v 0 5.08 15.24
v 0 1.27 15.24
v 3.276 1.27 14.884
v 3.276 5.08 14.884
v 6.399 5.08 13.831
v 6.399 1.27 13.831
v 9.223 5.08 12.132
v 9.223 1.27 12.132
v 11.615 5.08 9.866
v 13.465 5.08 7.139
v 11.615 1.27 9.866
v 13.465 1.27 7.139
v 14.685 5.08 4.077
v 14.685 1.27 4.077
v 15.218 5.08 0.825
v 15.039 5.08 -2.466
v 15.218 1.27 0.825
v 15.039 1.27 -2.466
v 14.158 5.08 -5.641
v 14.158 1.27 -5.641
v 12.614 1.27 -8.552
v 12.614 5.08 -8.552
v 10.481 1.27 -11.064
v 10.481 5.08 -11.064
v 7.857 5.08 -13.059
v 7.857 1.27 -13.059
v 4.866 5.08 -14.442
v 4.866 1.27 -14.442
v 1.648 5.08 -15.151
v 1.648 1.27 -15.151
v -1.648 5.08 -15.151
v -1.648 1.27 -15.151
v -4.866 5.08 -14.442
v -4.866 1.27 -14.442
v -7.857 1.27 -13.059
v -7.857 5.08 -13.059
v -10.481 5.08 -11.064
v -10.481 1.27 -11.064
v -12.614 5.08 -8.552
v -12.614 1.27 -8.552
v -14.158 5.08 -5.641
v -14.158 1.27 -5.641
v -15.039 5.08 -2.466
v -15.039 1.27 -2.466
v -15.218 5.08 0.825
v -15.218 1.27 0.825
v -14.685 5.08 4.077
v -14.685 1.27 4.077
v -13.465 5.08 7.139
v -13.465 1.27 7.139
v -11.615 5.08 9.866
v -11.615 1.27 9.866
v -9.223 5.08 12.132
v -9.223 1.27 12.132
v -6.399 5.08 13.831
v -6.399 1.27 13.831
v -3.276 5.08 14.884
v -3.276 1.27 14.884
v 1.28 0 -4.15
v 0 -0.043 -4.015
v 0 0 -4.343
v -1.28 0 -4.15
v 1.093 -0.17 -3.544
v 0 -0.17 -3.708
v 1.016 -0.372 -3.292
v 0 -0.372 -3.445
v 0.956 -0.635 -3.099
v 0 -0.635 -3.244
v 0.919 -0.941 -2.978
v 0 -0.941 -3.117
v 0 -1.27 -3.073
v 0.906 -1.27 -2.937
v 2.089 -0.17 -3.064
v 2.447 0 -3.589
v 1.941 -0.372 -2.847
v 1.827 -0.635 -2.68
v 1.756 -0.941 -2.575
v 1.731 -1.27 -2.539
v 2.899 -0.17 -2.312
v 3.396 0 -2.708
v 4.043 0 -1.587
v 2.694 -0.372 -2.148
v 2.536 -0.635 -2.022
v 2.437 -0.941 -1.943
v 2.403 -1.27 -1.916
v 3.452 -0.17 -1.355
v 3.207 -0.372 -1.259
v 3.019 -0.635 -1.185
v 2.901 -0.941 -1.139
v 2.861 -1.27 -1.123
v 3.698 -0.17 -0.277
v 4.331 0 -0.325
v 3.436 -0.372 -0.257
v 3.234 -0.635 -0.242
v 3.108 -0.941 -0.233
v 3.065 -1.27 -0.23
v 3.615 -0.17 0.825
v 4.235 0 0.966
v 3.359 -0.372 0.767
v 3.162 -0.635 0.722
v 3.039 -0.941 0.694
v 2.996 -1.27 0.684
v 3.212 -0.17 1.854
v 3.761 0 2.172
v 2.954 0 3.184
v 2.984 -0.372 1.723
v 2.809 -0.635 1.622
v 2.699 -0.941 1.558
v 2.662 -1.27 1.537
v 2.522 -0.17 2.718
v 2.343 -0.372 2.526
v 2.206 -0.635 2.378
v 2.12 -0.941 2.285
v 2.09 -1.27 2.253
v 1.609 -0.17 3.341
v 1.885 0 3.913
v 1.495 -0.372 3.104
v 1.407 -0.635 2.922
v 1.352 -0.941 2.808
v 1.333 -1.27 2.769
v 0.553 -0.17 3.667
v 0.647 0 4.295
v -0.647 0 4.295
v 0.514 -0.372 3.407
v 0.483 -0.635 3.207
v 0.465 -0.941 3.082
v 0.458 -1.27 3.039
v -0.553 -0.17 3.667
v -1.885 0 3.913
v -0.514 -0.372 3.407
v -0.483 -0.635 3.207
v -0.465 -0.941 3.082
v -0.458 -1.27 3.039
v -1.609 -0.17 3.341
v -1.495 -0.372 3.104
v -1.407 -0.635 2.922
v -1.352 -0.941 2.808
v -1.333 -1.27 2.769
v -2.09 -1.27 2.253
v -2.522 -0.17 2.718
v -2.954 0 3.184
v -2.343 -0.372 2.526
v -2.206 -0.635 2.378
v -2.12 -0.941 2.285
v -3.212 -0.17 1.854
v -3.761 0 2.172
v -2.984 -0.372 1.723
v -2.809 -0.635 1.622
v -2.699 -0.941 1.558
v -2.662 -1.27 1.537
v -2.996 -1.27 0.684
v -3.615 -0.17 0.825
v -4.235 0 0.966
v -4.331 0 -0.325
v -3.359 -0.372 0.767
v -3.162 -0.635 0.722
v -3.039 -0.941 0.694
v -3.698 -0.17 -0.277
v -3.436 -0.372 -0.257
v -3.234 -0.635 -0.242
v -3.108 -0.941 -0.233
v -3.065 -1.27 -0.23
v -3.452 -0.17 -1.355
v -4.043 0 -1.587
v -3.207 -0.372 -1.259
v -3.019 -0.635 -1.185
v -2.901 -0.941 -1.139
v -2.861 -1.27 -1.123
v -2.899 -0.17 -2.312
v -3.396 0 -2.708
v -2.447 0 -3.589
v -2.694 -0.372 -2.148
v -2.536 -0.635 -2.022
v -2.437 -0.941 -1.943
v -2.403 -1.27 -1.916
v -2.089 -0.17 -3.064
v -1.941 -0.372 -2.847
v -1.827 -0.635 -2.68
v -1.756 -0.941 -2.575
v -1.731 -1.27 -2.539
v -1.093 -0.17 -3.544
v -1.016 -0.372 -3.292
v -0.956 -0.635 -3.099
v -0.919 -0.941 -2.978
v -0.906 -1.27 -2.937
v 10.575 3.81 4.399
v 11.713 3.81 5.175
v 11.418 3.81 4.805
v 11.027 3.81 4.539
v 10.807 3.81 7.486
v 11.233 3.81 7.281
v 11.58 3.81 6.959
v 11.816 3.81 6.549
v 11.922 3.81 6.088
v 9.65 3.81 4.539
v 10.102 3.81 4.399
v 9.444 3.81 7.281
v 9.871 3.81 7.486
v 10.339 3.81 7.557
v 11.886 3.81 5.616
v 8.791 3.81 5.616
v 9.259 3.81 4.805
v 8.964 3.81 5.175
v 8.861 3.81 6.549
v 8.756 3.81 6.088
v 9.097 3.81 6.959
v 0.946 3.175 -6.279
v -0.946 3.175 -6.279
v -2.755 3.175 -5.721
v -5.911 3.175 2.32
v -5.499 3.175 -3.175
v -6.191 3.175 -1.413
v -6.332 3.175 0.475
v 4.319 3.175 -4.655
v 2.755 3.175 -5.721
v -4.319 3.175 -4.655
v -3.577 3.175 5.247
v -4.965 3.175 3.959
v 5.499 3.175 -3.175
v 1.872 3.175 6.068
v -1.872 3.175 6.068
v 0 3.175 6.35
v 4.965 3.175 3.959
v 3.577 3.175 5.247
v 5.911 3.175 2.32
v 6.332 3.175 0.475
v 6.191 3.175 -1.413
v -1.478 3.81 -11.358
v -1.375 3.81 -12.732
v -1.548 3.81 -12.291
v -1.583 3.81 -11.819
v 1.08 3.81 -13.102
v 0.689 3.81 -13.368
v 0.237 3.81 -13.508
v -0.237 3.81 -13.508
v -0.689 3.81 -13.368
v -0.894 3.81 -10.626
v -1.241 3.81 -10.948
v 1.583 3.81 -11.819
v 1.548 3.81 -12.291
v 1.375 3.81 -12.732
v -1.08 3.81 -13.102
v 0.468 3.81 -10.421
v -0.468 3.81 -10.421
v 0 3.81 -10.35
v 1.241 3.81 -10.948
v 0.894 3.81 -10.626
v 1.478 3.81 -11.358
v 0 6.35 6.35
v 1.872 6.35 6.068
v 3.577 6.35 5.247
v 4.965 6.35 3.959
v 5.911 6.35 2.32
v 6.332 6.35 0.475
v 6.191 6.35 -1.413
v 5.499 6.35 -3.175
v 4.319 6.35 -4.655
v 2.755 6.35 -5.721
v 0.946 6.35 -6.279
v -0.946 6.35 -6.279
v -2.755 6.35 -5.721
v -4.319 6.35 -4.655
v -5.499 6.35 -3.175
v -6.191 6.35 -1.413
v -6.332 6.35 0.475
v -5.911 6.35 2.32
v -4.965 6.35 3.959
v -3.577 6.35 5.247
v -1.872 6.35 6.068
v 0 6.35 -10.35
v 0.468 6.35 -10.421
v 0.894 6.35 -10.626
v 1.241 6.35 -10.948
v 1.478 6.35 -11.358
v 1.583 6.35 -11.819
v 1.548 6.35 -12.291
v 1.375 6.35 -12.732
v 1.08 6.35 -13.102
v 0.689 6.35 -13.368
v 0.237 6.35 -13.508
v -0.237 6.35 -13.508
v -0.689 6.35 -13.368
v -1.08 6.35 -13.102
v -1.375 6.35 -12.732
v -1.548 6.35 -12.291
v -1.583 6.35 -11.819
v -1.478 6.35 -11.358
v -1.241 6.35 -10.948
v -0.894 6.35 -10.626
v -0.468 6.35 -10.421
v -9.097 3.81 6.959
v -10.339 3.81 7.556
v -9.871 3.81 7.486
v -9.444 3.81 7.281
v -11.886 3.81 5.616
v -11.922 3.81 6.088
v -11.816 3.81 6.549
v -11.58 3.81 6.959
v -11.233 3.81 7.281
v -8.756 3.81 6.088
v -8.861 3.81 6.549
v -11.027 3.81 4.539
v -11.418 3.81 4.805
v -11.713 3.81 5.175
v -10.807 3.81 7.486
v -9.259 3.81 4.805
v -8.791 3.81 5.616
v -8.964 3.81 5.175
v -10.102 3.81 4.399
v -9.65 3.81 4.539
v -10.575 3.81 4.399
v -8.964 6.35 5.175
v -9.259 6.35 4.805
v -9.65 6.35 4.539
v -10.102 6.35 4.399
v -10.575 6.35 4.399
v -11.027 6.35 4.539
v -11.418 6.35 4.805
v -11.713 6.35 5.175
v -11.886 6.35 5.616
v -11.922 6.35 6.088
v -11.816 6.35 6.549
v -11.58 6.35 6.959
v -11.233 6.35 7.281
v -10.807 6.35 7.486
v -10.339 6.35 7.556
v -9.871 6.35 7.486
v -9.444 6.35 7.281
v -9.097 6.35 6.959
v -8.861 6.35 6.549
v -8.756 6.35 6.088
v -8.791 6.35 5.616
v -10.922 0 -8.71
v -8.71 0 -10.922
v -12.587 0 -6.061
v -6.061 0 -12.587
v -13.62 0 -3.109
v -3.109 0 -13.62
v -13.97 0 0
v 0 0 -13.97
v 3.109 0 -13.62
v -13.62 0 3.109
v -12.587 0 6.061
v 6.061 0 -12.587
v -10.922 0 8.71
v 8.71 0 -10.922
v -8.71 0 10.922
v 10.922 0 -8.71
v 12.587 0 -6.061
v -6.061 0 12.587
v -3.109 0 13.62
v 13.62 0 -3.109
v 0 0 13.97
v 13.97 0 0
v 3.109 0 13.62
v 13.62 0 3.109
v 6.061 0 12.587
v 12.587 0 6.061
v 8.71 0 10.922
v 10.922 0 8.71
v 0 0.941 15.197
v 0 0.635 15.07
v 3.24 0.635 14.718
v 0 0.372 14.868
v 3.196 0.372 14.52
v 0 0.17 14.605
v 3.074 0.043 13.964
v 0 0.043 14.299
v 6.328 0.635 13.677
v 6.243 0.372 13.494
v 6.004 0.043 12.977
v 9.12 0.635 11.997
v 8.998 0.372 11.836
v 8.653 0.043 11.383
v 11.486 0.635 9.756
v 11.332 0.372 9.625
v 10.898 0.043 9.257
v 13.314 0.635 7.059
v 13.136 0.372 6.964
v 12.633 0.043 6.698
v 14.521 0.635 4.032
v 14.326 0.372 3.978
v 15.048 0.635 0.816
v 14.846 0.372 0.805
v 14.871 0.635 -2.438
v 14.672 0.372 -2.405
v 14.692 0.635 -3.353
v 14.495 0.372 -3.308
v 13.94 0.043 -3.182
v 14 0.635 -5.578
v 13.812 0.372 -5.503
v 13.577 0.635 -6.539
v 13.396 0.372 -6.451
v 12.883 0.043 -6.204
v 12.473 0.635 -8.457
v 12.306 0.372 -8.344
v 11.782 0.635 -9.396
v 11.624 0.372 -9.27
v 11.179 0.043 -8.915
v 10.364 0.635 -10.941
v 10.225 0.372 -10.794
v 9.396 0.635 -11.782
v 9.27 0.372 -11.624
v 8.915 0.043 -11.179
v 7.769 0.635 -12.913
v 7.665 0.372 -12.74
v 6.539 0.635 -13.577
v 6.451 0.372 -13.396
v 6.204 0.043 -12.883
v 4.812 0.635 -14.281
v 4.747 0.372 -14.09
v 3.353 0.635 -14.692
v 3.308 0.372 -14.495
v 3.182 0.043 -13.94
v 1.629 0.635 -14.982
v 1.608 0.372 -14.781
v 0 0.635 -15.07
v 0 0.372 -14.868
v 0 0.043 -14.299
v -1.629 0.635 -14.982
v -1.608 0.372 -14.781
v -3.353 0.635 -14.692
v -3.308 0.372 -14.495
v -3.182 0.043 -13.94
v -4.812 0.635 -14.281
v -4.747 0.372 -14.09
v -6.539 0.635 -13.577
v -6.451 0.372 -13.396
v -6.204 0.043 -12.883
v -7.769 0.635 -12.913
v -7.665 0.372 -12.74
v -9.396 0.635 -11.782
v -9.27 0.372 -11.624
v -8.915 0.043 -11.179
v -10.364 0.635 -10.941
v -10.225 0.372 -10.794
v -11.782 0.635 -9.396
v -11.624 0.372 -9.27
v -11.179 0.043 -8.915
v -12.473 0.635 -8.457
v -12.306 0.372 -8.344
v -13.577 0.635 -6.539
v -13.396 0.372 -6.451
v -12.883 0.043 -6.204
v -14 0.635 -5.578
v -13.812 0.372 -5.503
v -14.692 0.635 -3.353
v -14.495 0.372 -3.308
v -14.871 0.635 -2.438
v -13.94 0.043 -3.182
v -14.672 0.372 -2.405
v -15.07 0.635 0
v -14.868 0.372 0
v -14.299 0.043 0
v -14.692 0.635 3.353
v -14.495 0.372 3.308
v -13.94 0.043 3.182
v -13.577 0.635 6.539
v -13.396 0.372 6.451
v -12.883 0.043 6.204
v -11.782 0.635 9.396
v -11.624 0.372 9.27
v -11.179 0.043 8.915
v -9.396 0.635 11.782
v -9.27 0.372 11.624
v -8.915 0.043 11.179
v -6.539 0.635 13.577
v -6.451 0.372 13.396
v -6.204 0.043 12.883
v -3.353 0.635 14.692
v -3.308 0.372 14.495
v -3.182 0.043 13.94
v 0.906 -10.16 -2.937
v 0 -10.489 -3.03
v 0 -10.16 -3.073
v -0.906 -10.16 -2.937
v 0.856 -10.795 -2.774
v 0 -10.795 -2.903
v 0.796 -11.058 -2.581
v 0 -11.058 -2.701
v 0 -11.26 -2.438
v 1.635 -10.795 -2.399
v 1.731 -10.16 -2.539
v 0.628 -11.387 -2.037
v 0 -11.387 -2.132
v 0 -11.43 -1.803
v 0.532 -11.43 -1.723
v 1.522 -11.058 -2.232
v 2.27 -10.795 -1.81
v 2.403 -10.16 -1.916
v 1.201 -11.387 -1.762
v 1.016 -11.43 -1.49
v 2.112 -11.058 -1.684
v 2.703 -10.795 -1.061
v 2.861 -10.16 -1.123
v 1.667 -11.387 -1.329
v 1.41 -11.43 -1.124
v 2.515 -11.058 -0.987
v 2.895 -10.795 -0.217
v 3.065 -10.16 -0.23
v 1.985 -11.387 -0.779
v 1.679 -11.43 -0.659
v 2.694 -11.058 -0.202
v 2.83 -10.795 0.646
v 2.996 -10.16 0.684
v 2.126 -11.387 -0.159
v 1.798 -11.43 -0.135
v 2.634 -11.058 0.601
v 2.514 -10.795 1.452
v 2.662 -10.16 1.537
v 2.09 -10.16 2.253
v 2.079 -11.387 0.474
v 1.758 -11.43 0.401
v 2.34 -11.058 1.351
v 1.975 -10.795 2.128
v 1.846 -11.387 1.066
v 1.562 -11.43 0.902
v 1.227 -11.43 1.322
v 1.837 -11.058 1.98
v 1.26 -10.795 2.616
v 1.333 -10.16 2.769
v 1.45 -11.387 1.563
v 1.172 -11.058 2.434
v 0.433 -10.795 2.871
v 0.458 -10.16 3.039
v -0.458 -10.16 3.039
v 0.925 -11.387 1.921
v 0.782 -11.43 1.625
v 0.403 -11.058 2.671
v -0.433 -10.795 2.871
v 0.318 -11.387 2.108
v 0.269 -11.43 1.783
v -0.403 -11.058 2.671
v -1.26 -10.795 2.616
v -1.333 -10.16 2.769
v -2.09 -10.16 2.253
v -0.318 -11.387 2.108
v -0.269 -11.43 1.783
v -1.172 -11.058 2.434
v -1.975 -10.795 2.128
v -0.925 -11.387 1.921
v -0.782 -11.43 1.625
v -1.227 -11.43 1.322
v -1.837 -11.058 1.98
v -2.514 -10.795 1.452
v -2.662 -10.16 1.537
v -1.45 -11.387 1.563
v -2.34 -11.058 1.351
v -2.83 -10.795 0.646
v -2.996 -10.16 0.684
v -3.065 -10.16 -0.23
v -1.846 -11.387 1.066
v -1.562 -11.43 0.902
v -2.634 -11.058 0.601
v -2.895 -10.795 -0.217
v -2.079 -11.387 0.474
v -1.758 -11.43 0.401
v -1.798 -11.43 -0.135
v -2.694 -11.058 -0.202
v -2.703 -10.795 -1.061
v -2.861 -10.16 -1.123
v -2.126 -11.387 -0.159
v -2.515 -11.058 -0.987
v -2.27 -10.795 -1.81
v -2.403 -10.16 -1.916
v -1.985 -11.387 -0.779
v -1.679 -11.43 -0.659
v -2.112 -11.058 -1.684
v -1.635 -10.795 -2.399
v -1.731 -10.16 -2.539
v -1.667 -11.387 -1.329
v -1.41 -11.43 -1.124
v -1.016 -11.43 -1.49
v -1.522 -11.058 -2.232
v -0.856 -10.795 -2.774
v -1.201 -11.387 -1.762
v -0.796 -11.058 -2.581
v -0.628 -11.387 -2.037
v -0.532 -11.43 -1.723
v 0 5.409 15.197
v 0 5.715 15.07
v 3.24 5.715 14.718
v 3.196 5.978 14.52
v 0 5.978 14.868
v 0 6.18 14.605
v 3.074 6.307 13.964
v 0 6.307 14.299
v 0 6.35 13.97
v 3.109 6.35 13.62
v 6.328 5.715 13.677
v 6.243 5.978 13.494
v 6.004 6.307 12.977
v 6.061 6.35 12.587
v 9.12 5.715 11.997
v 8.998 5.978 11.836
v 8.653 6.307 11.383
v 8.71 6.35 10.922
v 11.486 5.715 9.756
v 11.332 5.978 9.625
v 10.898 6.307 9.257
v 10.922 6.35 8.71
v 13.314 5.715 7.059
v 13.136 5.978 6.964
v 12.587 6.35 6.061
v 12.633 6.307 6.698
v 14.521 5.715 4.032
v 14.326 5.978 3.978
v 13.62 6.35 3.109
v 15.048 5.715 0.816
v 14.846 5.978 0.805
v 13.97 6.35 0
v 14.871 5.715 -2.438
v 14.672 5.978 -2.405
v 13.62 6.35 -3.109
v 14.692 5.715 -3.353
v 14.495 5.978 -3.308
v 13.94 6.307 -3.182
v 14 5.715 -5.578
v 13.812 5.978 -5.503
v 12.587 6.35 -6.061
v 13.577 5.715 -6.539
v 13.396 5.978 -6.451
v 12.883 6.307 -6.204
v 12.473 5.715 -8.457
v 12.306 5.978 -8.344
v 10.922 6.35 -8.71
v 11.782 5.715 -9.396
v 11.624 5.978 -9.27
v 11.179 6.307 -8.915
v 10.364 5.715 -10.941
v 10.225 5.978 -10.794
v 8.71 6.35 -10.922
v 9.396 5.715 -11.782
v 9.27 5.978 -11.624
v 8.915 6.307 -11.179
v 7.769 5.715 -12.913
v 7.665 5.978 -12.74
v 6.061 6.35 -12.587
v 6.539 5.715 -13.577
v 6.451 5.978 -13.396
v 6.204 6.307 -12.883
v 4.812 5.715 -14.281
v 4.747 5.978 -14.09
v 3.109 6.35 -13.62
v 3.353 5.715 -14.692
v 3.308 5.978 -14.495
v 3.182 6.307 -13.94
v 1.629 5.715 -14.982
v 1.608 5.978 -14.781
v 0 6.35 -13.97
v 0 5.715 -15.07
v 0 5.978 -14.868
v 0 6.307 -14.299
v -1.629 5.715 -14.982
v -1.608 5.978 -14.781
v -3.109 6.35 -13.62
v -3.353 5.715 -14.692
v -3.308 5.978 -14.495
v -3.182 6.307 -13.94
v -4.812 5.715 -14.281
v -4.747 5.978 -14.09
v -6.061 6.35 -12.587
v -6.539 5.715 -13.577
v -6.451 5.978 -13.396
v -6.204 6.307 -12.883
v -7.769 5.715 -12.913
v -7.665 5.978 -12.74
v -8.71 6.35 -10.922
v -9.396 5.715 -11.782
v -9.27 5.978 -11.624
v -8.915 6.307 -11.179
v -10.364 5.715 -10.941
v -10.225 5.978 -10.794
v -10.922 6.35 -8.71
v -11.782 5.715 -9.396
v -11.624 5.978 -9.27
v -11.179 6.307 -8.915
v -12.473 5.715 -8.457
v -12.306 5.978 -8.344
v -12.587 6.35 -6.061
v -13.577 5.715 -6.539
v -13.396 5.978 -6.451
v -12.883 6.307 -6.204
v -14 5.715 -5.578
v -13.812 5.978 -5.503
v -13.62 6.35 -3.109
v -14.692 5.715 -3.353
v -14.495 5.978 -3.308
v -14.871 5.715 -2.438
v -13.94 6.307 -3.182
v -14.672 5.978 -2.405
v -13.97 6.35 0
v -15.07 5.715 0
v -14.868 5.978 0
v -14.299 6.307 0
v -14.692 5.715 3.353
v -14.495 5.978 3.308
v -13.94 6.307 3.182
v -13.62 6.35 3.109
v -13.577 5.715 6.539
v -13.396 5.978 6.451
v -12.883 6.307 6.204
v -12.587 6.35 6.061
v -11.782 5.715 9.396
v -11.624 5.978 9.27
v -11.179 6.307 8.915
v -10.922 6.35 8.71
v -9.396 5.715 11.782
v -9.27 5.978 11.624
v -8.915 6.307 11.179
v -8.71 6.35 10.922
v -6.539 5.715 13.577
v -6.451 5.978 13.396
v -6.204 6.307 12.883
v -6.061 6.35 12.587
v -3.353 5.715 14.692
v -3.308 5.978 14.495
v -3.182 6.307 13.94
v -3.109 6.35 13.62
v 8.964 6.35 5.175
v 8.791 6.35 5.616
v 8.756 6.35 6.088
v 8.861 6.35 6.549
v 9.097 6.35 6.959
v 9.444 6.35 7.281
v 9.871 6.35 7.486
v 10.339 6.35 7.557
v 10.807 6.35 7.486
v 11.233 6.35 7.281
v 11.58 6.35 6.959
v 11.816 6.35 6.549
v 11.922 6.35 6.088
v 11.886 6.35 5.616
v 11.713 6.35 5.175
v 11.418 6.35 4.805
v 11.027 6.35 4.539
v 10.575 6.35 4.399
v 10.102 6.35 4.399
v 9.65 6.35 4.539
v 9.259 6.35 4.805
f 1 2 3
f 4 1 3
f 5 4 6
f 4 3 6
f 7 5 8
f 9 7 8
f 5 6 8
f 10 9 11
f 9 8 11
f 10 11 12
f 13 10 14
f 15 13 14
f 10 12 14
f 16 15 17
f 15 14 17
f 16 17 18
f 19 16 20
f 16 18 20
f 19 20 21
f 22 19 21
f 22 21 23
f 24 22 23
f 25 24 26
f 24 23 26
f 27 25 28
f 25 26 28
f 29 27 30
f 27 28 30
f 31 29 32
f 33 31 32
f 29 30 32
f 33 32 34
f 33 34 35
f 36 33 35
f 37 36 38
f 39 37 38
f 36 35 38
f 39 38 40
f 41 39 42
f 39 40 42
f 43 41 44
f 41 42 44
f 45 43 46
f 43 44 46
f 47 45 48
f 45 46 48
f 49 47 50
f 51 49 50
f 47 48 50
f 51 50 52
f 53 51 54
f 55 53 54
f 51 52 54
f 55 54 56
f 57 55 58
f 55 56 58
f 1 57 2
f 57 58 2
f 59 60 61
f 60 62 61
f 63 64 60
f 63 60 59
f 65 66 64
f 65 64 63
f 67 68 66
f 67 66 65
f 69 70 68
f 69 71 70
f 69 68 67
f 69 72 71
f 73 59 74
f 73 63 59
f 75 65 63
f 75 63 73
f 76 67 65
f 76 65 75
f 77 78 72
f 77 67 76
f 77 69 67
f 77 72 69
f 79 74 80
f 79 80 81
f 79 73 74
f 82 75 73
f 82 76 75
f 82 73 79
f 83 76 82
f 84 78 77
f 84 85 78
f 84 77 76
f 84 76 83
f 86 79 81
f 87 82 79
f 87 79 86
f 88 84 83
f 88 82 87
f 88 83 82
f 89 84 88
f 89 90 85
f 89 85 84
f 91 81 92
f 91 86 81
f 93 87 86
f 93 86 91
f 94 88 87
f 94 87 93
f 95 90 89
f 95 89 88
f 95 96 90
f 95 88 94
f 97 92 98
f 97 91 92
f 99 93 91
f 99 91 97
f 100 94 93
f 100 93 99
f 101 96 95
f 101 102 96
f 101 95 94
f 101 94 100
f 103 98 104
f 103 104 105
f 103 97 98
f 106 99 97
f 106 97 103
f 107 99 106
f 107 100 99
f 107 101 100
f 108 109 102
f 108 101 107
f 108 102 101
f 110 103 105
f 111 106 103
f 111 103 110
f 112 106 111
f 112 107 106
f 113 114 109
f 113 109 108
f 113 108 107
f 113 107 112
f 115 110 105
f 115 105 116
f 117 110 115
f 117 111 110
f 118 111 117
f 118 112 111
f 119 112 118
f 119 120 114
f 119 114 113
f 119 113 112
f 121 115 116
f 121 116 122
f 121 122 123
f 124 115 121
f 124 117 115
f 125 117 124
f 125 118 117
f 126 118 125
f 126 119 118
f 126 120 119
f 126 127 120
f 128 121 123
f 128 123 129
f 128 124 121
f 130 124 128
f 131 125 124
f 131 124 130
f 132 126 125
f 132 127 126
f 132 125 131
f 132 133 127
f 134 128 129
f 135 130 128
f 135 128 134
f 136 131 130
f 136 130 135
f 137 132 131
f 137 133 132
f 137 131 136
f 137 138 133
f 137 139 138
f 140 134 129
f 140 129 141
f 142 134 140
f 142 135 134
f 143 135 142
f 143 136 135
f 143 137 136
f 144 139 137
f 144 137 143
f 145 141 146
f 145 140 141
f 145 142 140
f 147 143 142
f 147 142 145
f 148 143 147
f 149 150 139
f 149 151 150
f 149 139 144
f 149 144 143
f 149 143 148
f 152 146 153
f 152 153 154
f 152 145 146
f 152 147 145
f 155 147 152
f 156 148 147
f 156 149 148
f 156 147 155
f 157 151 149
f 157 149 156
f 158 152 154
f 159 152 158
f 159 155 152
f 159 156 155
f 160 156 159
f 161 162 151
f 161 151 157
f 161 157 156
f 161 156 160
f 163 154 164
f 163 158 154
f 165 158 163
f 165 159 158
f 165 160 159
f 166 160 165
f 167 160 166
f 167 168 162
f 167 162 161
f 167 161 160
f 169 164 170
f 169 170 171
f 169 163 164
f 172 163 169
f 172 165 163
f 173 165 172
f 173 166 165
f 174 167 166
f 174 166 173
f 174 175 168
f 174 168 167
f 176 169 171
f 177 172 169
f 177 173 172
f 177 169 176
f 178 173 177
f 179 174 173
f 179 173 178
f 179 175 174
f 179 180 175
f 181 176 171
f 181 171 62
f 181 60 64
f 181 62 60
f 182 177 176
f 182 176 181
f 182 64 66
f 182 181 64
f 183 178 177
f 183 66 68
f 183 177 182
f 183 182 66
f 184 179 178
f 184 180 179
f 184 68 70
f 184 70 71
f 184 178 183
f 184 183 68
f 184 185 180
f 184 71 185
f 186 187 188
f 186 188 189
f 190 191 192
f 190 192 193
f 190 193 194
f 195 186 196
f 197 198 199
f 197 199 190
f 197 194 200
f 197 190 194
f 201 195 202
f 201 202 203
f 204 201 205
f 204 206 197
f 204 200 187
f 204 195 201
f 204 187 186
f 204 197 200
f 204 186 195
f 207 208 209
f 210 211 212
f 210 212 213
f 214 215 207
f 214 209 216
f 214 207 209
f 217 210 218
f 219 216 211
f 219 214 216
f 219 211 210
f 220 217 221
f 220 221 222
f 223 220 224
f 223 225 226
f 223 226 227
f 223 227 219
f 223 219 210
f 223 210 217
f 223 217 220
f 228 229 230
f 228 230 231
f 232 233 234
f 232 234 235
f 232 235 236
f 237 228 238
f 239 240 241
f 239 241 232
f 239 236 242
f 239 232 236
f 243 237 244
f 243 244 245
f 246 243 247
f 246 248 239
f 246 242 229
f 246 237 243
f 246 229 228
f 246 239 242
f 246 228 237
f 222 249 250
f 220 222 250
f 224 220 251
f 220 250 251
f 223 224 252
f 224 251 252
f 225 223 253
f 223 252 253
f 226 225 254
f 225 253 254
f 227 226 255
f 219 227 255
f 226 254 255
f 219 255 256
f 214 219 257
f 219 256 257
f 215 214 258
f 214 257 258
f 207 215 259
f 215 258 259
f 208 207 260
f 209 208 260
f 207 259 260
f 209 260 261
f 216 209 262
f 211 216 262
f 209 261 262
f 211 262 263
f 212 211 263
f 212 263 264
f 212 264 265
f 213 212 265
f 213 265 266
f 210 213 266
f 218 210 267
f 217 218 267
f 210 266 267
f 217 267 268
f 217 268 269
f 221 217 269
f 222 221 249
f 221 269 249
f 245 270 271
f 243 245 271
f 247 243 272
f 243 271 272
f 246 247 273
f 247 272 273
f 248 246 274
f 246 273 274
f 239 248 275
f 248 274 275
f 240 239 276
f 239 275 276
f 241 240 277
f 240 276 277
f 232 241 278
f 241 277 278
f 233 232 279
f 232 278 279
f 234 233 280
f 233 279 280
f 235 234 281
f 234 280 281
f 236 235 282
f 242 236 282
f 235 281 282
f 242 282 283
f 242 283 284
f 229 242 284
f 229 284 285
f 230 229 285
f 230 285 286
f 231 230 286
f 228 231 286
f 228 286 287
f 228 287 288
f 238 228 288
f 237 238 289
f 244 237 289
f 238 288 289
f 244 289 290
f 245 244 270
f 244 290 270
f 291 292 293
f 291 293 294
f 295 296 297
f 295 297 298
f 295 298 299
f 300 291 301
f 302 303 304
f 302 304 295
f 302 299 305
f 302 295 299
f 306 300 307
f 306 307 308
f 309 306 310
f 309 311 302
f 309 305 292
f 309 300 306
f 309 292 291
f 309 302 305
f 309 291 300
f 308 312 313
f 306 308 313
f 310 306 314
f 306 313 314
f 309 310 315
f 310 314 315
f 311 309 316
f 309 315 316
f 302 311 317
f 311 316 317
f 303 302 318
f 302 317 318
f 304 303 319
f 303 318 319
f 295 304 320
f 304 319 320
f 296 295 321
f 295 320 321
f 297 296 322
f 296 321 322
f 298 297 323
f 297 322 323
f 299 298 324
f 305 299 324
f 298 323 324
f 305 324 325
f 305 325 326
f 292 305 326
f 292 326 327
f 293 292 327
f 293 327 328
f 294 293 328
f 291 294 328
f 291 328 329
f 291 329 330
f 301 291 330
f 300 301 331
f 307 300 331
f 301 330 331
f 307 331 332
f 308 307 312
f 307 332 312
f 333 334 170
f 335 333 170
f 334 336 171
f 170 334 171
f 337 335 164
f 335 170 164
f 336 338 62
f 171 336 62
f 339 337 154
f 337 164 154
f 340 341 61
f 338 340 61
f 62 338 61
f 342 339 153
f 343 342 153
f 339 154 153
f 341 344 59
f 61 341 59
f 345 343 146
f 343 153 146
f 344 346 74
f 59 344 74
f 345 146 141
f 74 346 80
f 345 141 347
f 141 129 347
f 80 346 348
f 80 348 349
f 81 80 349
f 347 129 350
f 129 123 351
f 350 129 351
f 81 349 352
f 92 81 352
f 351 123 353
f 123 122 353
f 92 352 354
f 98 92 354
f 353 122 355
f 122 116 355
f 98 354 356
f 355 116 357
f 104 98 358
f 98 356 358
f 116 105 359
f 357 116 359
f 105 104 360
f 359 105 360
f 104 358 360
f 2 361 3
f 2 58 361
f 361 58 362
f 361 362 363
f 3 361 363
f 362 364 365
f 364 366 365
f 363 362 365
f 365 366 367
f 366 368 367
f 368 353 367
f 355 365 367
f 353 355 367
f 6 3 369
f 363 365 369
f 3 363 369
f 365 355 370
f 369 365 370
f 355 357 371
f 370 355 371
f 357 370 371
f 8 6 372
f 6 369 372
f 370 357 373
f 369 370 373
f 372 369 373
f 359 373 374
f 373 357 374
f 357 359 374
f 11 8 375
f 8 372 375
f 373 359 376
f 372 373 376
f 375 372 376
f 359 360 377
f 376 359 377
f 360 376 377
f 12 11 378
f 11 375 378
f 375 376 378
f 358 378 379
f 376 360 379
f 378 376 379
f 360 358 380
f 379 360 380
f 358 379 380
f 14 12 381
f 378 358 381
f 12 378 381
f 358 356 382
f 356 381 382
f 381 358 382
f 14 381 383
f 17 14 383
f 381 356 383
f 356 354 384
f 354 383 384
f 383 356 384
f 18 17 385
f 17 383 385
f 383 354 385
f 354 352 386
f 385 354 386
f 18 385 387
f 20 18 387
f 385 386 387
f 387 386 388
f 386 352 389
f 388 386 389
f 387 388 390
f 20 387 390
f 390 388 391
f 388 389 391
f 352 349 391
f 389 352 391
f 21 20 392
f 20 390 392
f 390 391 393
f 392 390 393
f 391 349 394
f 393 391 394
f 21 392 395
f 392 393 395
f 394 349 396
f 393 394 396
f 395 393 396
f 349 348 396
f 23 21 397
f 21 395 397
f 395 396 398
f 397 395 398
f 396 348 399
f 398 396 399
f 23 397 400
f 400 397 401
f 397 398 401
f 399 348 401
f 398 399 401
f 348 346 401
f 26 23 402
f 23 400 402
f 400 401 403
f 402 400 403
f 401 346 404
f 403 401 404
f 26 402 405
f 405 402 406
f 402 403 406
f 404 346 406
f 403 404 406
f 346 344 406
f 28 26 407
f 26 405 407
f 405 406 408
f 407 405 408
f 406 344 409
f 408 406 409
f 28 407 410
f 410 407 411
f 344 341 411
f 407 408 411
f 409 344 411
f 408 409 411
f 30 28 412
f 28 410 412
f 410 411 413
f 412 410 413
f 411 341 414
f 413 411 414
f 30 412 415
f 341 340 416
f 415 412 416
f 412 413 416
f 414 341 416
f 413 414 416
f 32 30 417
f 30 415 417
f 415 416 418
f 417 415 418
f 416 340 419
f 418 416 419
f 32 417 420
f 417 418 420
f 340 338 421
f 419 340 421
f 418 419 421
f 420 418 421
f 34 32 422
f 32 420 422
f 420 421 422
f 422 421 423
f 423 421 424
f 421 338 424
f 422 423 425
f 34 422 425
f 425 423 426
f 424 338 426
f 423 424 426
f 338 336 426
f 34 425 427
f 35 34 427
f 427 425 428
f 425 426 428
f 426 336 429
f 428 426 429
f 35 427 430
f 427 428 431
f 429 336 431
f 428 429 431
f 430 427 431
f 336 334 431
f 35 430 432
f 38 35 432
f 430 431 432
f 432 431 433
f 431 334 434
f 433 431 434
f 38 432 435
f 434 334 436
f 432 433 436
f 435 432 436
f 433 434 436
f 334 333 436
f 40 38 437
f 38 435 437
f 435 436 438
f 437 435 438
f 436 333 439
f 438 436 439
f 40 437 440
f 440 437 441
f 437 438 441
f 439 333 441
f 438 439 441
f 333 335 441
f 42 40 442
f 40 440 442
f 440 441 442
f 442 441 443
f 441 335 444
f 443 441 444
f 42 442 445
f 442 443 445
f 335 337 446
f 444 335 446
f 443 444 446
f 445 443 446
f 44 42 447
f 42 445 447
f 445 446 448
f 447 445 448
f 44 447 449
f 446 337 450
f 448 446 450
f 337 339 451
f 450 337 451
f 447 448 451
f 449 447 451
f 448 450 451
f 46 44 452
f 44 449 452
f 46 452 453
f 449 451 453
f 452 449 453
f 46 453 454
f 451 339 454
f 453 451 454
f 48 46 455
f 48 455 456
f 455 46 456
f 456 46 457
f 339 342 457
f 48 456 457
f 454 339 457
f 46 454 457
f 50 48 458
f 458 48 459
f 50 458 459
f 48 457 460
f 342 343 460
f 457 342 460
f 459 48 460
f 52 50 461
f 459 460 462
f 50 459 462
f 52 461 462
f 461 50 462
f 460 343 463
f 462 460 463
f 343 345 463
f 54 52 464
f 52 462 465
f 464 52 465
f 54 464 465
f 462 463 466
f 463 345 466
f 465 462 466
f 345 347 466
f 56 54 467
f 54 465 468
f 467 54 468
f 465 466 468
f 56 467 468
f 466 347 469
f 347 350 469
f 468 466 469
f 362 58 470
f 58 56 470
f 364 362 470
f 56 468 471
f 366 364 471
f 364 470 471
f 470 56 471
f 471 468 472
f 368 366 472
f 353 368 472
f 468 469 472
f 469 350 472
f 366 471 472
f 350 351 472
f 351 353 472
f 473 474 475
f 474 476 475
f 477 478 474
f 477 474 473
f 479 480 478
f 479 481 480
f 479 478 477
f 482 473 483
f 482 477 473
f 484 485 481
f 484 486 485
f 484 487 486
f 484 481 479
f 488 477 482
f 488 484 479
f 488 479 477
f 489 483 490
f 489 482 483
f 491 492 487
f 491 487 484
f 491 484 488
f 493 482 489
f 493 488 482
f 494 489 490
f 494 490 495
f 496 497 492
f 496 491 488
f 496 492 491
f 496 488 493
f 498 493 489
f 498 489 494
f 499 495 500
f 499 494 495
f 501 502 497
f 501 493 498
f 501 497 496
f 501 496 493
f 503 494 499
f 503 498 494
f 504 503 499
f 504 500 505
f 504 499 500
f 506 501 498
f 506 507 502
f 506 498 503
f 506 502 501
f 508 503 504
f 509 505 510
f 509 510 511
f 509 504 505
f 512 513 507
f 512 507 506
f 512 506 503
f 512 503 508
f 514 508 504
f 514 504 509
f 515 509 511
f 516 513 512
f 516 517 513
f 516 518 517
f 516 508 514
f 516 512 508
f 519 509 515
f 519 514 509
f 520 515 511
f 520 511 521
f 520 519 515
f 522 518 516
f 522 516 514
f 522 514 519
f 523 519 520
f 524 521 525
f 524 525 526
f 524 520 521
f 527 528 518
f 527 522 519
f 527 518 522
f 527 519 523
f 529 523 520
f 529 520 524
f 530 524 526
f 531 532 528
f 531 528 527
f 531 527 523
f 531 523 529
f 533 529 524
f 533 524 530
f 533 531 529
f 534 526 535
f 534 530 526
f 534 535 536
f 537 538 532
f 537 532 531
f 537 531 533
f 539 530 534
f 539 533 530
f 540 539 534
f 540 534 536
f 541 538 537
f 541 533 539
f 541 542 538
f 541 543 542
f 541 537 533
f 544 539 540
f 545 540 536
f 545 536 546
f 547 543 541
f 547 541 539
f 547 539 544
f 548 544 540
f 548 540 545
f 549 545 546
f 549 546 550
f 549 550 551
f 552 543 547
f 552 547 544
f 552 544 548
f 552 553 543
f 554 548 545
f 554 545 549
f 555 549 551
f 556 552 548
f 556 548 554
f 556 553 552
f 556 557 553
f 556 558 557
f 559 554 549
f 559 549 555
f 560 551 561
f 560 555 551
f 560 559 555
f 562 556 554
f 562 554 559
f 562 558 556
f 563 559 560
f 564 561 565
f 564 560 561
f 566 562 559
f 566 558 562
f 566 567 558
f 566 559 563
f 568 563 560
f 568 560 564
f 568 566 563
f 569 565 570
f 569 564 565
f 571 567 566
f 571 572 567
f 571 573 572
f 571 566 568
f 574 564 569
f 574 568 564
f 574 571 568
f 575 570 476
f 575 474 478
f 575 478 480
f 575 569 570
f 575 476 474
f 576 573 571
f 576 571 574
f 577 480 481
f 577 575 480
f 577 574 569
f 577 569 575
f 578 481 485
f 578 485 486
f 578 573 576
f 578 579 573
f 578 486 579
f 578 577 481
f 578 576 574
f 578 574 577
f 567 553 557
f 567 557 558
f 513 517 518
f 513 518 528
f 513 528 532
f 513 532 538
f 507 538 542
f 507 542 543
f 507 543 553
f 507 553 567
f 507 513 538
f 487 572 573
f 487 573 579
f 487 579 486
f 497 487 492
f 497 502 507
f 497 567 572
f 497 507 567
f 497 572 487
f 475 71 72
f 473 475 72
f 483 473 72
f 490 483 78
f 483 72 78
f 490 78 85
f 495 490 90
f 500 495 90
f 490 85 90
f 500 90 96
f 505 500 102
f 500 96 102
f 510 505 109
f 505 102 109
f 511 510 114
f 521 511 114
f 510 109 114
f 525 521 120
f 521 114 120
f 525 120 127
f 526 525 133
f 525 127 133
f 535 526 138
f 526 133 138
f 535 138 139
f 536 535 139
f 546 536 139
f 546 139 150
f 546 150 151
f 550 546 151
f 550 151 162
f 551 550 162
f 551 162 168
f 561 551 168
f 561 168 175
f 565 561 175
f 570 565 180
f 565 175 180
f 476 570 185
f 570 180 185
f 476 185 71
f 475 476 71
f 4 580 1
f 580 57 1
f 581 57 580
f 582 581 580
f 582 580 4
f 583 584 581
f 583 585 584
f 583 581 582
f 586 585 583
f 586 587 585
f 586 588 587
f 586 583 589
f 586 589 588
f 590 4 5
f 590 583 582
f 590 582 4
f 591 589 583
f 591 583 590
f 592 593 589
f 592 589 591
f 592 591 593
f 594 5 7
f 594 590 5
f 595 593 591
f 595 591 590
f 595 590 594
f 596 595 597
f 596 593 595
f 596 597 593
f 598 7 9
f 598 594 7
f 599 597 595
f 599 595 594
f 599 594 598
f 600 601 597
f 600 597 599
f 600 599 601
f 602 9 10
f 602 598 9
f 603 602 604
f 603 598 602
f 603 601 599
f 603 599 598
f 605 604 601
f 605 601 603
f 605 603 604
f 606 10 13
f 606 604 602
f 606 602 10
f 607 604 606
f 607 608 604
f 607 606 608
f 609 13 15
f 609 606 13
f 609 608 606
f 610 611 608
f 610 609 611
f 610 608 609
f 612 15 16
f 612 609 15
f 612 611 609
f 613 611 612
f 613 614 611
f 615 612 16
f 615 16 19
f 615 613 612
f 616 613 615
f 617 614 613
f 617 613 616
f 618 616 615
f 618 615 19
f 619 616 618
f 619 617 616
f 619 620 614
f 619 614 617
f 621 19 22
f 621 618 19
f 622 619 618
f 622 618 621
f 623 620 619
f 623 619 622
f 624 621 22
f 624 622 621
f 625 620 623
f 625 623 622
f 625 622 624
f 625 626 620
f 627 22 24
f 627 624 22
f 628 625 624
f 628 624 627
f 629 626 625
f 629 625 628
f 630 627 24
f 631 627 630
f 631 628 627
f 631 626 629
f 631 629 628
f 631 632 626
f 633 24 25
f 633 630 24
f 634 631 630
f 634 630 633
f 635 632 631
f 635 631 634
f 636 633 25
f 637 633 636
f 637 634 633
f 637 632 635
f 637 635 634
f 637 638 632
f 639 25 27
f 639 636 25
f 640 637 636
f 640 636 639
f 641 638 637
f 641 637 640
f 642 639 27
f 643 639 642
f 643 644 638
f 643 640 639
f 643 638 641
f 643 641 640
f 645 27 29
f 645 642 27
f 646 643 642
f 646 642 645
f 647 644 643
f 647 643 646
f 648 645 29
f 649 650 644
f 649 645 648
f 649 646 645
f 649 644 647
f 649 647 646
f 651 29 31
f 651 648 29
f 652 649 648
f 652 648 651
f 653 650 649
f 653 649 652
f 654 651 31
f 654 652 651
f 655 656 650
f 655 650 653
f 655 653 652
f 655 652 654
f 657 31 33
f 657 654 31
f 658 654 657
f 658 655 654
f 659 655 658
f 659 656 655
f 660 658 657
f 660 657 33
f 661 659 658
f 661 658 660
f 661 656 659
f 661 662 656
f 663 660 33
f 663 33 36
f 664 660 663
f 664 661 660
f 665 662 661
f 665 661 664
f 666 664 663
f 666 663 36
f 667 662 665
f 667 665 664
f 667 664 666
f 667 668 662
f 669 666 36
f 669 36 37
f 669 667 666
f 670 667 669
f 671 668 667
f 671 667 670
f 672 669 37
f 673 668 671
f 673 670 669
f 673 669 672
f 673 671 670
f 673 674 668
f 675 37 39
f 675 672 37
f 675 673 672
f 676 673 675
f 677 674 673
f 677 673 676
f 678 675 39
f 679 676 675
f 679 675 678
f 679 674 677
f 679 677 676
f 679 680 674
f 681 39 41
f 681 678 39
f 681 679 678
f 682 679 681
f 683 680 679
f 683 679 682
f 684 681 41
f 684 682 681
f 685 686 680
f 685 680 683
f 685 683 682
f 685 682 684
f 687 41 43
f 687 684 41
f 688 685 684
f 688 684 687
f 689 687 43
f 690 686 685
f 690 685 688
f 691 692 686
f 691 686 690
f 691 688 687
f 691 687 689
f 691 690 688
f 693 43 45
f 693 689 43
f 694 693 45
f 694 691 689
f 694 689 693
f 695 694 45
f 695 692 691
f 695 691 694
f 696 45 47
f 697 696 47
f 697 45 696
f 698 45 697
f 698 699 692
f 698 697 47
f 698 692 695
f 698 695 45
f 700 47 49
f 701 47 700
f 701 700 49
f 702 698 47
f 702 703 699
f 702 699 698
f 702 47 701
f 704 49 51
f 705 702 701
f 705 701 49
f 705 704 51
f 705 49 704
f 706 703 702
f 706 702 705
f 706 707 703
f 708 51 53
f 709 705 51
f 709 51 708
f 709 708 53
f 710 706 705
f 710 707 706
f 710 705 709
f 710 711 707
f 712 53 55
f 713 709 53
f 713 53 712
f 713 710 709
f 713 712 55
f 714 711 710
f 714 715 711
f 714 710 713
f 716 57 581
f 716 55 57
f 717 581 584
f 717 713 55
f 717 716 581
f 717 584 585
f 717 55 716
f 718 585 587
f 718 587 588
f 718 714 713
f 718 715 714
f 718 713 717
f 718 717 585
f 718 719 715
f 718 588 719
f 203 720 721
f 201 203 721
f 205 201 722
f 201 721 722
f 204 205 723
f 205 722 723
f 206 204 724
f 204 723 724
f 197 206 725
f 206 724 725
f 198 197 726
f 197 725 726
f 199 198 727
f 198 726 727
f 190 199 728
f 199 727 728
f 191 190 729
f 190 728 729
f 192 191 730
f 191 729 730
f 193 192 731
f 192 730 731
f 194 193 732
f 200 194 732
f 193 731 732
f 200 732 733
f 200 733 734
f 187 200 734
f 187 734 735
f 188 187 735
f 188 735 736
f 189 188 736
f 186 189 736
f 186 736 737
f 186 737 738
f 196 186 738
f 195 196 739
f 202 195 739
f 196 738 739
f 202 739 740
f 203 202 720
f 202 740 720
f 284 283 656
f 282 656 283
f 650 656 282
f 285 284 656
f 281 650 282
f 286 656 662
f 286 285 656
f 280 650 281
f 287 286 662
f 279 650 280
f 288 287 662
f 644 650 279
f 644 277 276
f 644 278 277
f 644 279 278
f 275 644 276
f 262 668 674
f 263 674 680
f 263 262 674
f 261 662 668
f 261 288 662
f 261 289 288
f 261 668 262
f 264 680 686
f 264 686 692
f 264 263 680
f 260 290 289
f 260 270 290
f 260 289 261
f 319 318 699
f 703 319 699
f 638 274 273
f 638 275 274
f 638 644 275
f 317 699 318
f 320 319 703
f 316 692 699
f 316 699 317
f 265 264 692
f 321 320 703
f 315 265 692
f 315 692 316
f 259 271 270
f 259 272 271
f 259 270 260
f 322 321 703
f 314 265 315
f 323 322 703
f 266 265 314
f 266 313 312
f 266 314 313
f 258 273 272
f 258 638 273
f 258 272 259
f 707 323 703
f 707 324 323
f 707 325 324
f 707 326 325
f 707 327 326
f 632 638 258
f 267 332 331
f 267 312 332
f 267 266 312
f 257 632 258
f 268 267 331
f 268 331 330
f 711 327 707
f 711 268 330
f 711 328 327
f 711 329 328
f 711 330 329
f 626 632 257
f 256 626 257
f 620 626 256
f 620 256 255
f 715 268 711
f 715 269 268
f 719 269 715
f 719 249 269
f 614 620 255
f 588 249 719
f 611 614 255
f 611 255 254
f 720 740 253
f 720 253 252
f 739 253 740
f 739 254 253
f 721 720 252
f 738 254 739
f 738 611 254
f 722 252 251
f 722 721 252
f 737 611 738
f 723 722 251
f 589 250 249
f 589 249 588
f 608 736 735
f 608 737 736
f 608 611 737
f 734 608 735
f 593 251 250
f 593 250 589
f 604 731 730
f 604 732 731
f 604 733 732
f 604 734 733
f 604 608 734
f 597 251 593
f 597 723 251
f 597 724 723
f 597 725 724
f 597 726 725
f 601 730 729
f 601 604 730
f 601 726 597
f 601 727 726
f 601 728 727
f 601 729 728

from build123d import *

# Parameters (mm, degrees)
SKETCH1_R           = 15.24
BOSS_EXTRUDE1_DEPTH = 6.35
SKETCH2_R           = 6.35
CUT_EXTRUDE1_DEPTH  = 3.175
FILLET4_R           = 1.27
SKETCH3_R           = 3.0734
BOSS_EXTRUDE3_DEPTH = 11.43
FILLET5_R           = 1.27
SKETCH4_R           = 1.5875
CUT_EXTRUDE2_DEPTH  = 2.54
CIRPATTERN1_COUNT   = 3


with BuildPart() as part:
    # Sketch1 → Boss-Extrude1 (new body)
    with BuildSketch(Plane(origin=(0, 0, 0), x_dir=(1, 0, 0), z_dir=(0, 1, 0))):
        Circle(SKETCH1_R)
    extrude(amount=BOSS_EXTRUDE1_DEPTH)

    # Sketch2 → Cut-Extrude1 (cut)
    with BuildSketch(Plane(origin=(0, 6.35, 0), x_dir=(1, 0, 0), z_dir=(0, 1, 0))):
        Circle(SKETCH2_R)
    extrude(amount=-CUT_EXTRUDE1_DEPTH, mode=Mode.SUBTRACT)

    # Fillet4
    fillet4_edges = [part.edges().sort_by_distance(p)[0] for p in [
        (-15.24, 6.35, 0),
    ]]
    fillet(fillet4_edges, radius=FILLET4_R)

    # Sketch3 → Boss-Extrude3 (add)
    with BuildSketch(Plane.XZ):
        Circle(SKETCH3_R)
    extrude(amount=BOSS_EXTRUDE3_DEPTH)

    # Fillet5
    fillet5_edges = [part.edges().sort_by_distance(p)[0] for p in [
        (-3.0734, -11.43, 0),
        (-15.24, 0, 0),
        (-3.0734, 0, 0),
    ]]
    fillet(fillet5_edges, radius=FILLET5_R)

    # Sketch4 → Cut-Extrude2 (cut)
    with BuildSketch(Plane(origin=(0, 6.35, 0), x_dir=(1, 0, 0), z_dir=(0, 1, 0))):
        with Locations((0, 11.938)):
            Circle(SKETCH4_R)
    cut_extrude2 = extrude(amount=-CUT_EXTRUDE2_DEPTH, mode=Mode.SUBTRACT)

    # CirPattern1: Cut-Extrude2 ×3 about axis
    cirpattern1_axis = Axis((0, 3.175, 0), (0, 1, 0))
    for i in range(1, CIRPATTERN1_COUNT):
        add(cut_extrude2.rotate(cirpattern1_axis, i * 360 / CIRPATTERN1_COUNT), mode=Mode.SUBTRACT)


solid = part.part
